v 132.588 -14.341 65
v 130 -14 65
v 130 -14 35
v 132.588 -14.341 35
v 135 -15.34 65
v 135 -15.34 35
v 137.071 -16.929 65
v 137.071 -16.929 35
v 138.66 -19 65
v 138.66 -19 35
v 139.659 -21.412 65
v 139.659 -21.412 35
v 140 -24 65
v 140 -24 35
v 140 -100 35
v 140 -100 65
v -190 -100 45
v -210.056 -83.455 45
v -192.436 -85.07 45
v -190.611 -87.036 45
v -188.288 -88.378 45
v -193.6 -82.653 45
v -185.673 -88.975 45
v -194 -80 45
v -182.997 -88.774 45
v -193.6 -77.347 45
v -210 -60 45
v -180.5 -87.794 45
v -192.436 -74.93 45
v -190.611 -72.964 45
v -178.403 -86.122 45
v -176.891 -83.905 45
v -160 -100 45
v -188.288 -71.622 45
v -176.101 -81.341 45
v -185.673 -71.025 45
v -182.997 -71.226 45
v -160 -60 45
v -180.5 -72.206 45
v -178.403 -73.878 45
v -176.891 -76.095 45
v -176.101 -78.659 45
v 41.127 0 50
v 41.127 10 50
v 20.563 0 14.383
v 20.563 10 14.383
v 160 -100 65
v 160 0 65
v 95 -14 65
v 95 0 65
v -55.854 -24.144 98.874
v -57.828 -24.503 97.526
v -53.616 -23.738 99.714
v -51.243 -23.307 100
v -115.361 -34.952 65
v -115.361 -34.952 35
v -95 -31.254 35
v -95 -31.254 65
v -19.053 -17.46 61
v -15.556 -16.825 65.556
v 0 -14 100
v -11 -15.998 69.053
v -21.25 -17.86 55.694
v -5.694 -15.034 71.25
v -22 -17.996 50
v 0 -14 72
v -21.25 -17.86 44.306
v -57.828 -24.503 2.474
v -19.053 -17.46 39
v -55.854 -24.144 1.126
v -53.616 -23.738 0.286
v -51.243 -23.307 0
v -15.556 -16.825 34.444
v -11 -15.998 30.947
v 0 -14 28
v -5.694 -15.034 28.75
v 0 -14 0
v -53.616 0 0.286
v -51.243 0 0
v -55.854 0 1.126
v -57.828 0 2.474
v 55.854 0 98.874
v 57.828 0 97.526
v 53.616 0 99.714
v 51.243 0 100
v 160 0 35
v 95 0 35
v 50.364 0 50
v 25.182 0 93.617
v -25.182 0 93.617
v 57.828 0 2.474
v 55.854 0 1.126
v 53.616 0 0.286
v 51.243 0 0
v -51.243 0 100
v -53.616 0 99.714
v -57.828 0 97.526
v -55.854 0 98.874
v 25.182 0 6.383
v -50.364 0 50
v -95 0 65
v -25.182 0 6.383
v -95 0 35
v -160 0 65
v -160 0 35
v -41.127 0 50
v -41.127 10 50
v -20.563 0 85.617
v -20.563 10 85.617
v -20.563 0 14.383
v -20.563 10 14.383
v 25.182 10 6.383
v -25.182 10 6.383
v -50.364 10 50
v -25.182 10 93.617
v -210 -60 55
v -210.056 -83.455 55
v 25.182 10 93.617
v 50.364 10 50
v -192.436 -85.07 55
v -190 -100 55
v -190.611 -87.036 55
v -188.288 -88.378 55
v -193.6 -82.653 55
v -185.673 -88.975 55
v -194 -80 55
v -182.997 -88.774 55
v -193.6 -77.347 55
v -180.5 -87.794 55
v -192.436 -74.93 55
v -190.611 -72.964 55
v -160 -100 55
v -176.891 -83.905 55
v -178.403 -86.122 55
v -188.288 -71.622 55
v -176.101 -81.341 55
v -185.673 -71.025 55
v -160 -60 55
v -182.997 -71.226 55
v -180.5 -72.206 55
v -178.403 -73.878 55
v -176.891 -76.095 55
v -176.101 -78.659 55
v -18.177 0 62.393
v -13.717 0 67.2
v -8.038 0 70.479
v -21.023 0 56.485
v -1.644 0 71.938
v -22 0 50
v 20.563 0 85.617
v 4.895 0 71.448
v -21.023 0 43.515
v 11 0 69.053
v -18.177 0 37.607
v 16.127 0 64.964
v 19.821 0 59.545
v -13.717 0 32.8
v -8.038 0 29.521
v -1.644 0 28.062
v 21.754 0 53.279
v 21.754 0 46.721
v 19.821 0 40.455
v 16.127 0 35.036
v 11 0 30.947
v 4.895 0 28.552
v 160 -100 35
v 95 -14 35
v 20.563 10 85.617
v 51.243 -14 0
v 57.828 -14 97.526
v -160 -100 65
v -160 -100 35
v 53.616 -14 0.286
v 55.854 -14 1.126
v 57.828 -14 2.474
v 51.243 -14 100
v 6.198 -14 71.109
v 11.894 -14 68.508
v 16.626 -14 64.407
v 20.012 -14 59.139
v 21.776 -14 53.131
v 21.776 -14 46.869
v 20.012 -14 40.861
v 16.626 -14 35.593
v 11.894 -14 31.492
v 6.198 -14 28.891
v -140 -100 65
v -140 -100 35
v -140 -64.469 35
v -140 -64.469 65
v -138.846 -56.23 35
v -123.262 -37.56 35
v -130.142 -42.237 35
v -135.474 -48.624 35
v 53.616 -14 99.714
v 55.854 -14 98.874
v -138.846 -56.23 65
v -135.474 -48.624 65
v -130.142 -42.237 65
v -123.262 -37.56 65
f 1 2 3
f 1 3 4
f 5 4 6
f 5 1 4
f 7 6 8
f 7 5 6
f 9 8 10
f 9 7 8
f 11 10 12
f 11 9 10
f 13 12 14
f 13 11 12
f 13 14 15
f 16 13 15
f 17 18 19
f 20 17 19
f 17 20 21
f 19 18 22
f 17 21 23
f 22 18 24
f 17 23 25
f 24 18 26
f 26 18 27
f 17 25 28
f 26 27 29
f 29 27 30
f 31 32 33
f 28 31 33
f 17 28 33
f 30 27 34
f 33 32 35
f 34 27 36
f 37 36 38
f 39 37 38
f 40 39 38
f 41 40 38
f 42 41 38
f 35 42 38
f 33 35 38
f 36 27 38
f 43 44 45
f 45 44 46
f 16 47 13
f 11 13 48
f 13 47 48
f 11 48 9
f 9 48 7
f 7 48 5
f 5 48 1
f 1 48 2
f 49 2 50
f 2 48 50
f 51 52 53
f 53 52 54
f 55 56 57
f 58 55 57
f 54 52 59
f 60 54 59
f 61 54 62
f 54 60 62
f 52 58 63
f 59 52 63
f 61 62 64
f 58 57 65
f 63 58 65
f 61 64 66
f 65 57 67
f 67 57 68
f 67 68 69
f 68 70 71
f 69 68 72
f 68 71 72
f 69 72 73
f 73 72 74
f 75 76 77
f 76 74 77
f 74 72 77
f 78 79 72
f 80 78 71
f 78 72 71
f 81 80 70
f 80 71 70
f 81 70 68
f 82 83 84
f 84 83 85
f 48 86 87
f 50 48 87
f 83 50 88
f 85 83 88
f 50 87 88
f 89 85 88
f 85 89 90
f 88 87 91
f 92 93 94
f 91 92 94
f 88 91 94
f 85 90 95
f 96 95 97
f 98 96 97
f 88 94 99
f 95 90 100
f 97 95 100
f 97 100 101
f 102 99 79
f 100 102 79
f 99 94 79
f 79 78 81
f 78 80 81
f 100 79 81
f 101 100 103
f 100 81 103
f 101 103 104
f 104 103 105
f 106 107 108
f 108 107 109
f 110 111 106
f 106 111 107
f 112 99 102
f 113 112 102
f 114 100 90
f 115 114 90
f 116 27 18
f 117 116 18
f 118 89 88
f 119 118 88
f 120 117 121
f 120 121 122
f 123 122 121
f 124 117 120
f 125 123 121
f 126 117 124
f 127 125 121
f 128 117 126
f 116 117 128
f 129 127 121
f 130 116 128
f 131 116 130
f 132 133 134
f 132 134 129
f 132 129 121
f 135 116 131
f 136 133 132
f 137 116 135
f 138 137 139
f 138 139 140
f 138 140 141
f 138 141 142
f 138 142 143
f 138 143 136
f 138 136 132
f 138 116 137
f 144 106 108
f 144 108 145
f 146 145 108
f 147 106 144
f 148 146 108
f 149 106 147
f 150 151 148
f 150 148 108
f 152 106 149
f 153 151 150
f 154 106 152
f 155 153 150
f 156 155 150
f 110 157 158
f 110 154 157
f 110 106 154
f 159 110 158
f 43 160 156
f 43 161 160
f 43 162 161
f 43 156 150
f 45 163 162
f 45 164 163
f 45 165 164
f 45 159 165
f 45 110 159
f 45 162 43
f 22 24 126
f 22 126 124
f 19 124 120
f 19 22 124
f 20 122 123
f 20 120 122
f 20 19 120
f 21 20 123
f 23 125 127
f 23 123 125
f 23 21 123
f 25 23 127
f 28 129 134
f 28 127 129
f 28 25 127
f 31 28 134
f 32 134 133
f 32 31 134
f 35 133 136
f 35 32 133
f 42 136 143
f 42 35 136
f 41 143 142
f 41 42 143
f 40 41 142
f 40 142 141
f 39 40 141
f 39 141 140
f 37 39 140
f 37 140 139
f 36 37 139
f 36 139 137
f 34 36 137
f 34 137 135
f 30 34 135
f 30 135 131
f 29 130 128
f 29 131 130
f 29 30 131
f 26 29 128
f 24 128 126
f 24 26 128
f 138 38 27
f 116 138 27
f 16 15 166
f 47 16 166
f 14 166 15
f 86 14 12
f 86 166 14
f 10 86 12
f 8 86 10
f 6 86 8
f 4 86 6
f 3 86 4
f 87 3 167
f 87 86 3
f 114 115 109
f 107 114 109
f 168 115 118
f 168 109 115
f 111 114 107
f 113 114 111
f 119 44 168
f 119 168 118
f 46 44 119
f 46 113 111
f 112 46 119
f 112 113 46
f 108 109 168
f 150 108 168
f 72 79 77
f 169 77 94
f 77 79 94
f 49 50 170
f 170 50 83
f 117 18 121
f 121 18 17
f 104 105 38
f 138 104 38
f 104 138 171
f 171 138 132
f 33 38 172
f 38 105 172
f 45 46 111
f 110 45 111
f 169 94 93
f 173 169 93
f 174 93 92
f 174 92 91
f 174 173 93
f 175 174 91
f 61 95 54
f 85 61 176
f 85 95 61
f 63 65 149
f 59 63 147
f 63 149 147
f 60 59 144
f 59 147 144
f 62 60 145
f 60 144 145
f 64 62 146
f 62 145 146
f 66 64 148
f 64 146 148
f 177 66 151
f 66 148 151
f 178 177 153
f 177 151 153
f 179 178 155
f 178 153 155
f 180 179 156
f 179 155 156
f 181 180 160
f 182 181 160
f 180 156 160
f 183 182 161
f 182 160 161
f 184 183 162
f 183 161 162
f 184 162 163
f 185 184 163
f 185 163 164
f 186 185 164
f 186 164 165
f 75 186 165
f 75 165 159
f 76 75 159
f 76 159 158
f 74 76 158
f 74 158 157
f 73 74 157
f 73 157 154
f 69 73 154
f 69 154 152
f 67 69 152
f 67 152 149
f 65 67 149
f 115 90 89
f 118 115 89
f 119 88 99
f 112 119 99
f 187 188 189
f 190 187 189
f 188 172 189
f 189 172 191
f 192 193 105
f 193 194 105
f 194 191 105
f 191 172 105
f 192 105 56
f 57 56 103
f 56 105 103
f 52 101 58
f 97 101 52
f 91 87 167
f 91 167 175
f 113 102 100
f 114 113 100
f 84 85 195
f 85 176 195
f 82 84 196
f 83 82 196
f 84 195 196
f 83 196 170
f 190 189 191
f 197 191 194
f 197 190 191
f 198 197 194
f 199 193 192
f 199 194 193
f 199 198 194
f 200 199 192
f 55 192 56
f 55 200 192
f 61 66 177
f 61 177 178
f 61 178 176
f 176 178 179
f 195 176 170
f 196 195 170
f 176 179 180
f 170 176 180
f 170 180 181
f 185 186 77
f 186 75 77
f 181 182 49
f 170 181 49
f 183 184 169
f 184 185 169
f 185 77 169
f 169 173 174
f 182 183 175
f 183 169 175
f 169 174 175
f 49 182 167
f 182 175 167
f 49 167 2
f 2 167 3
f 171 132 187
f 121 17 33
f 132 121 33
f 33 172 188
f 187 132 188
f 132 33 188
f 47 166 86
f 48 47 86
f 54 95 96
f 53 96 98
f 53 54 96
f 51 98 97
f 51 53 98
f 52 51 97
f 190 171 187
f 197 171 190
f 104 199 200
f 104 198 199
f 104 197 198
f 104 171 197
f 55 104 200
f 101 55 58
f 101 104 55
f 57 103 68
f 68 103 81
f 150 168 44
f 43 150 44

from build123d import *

# Parameters (mm, degrees)
BOSS_EXTRUDE1_DEPTH      = 100
FILLET1_R                = 30
FILLET2_R                = 10
CUT_EXTRUDE1_DEPTH       = 100
CUT_EXTRUDE2_DEPTH       = 100
CUT_EXTRUDE3_DEPTH       = 100
CUT_EXTRUDE4_DEPTH       = 100
FILLET3_R                = 10
SKETCH9_R                = 22
CUT_EXTRUDE5_DEPTH       = 100
BOSS_EXTRUDE2_DEPTH      = 10
SKETCH11_R               = 22
CUT_EXTRUDE6_DEPTH       = 10
CUT_EXTRUDE7_DEPTH       = 10
BOSS_EXTRUDE3_DEPTH      = 5
BOSS_EXTRUDE3_DEPTH_BACK = 5
CUT_EXTRUDE10_DEPTH      = 240.057846604
CUT_EXTRUDE10_DEPTH_BACK = 240.057846604
SKETCH15_R               = 9


with BuildPart() as part:
    # Sketch2 → Boss-Extrude1 (new body)
    with BuildSketch(Plane.XY):
        Polygon((160, 0), (-160, 0), (-160, -100), (-140, -100), (-140, -39.427371229), (0, -14), (140, -14), (140, -100), (160, -100), align=None)
    extrude(amount=BOSS_EXTRUDE1_DEPTH)

    # Fillet1
    fillet1_edges = [part.edges().sort_by_distance(p)[0] for p in [
        (-140, -39.427371229, 50),
    ]]
    fillet(fillet1_edges, radius=FILLET1_R)

    # Fillet2
    fillet2_edges = [part.edges().sort_by_distance(p)[0] for p in [
        (140, -14, 50),
    ]]
    fillet(fillet2_edges, radius=FILLET2_R)

    # Sketch5 → Cut-Extrude1 (cut)
    with BuildSketch(Plane(origin=(0, 0, 0), x_dir=(1, 0, 0), z_dir=(0, 1, 0))):
        Polygon((-160, 0), (-160, -35), (-95, -35), (-55, 0), align=None)
    extrude(amount=-CUT_EXTRUDE1_DEPTH, mode=Mode.SUBTRACT)

    # Sketch6 → Cut-Extrude2 (cut)
    with BuildSketch(Plane(origin=(0, 0, 0), x_dir=(1, 0, 0), z_dir=(0, 1, 0))):
        Polygon((-160, -100), (-160, -65), (-95, -65), (-55, -100), align=None)
    extrude(amount=-CUT_EXTRUDE2_DEPTH, mode=Mode.SUBTRACT)

    # Sketch7 → Cut-Extrude3 (cut)
    with BuildSketch(Plane(origin=(0, 0, 0), x_dir=(1, 0, 0), z_dir=(0, 1, 0))):
        Polygon((160, 0), (160, -34.999520122), (95, -34.999520122), (55, 0), align=None)
    extrude(amount=-CUT_EXTRUDE3_DEPTH, mode=Mode.SUBTRACT)

    # Sketch8 → Cut-Extrude4 (cut)
    with BuildSketch(Plane(origin=(0, 0, 0), x_dir=(1, 0, 0), z_dir=(0, 1, 0))):
        Polygon((160, -100), (160, -65), (95, -65), (55, -100), align=None)
    extrude(amount=-CUT_EXTRUDE4_DEPTH, mode=Mode.SUBTRACT)

    # Fillet3
    fillet3_edges = [part.edges().sort_by_distance(p)[0] for p in [
        (55, -7, 100),
        (-55, -11.994662206, 0),
        (-55, -11.994662206, 100),
        (55, -7, 0),
    ]]
    fillet(fillet3_edges, radius=FILLET3_R)

    # Sketch9 → Cut-Extrude5 (cut)
    with BuildSketch(Plane(origin=(0, 0, 0), x_dir=(1, 0, 0), z_dir=(0, 1, 0))):
        with Locations(Location((0, -50, 0), (0, 0, 180))):
            Circle(SKETCH9_R)
    extrude(amount=-CUT_EXTRUDE5_DEPTH, mode=Mode.SUBTRACT)

    # Sketch10 → Boss-Extrude2 (add)
    with BuildSketch(Plane(origin=(0, 0, 0), x_dir=(1, 0, 0), z_dir=(0, 1, 0))):
        Polygon((-25.182222271, -6.383111579), (-50.364444542, -50), (-25.182222271, -93.616888421), (25.182222271, -93.616888421), (50.364444542, -50), (25.182222271, -6.383111579), align=None)
    extrude(amount=BOSS_EXTRUDE2_DEPTH)

    # Sketch11 → Cut-Extrude6 (cut)
    with BuildSketch(Plane(origin=(0, 10, 0), x_dir=(1, 0, 0), z_dir=(0, 1, 0))):
        with Locations(Location((0, -50, 0), (0, 0, 180))):
            Circle(SKETCH11_R)
    extrude(amount=-CUT_EXTRUDE6_DEPTH, mode=Mode.SUBTRACT)

    # Sketch12 → Cut-Extrude7 (cut)
    with BuildSketch(Plane(origin=(0, 10, 0), x_dir=(1, 0, 0), z_dir=(0, 1, 0))):
        Polygon((41.126840235, -50), (20.563420118, -14.383111579), (-20.563420118, -14.383111579), (-41.126840235, -50), (-20.563420118, -85.616888421), (20.563420118, -85.616888421), align=None)
    extrude(amount=-CUT_EXTRUDE7_DEPTH, mode=Mode.SUBTRACT)

    # Sketch14 → Boss-Extrude3 (add, two sides: drawn at the far end of the back side and taken through both)
    with BuildSketch(Plane.XY.offset(50).offset(-BOSS_EXTRUDE3_DEPTH_BACK)):
        Polygon((-160, -100), (-160, -60), (-210, -60), (-210.056311552, -83.454778124), (-190, -100), align=None)
    extrude(amount=BOSS_EXTRUDE3_DEPTH + BOSS_EXTRUDE3_DEPTH_BACK)

    # Sketch15 → Cut-Extrude10 (cut, two sides: drawn at the far end of the back side and taken through both)
    with BuildSketch(Plane.XY.offset(55).offset(-CUT_EXTRUDE10_DEPTH_BACK)):
        with Locations(Location((-185, -80, 0), (0, 0, 180))):
            Circle(SKETCH15_R)
    extrude(amount=CUT_EXTRUDE10_DEPTH + CUT_EXTRUDE10_DEPTH_BACK, mode=Mode.SUBTRACT)


solid = part.part
